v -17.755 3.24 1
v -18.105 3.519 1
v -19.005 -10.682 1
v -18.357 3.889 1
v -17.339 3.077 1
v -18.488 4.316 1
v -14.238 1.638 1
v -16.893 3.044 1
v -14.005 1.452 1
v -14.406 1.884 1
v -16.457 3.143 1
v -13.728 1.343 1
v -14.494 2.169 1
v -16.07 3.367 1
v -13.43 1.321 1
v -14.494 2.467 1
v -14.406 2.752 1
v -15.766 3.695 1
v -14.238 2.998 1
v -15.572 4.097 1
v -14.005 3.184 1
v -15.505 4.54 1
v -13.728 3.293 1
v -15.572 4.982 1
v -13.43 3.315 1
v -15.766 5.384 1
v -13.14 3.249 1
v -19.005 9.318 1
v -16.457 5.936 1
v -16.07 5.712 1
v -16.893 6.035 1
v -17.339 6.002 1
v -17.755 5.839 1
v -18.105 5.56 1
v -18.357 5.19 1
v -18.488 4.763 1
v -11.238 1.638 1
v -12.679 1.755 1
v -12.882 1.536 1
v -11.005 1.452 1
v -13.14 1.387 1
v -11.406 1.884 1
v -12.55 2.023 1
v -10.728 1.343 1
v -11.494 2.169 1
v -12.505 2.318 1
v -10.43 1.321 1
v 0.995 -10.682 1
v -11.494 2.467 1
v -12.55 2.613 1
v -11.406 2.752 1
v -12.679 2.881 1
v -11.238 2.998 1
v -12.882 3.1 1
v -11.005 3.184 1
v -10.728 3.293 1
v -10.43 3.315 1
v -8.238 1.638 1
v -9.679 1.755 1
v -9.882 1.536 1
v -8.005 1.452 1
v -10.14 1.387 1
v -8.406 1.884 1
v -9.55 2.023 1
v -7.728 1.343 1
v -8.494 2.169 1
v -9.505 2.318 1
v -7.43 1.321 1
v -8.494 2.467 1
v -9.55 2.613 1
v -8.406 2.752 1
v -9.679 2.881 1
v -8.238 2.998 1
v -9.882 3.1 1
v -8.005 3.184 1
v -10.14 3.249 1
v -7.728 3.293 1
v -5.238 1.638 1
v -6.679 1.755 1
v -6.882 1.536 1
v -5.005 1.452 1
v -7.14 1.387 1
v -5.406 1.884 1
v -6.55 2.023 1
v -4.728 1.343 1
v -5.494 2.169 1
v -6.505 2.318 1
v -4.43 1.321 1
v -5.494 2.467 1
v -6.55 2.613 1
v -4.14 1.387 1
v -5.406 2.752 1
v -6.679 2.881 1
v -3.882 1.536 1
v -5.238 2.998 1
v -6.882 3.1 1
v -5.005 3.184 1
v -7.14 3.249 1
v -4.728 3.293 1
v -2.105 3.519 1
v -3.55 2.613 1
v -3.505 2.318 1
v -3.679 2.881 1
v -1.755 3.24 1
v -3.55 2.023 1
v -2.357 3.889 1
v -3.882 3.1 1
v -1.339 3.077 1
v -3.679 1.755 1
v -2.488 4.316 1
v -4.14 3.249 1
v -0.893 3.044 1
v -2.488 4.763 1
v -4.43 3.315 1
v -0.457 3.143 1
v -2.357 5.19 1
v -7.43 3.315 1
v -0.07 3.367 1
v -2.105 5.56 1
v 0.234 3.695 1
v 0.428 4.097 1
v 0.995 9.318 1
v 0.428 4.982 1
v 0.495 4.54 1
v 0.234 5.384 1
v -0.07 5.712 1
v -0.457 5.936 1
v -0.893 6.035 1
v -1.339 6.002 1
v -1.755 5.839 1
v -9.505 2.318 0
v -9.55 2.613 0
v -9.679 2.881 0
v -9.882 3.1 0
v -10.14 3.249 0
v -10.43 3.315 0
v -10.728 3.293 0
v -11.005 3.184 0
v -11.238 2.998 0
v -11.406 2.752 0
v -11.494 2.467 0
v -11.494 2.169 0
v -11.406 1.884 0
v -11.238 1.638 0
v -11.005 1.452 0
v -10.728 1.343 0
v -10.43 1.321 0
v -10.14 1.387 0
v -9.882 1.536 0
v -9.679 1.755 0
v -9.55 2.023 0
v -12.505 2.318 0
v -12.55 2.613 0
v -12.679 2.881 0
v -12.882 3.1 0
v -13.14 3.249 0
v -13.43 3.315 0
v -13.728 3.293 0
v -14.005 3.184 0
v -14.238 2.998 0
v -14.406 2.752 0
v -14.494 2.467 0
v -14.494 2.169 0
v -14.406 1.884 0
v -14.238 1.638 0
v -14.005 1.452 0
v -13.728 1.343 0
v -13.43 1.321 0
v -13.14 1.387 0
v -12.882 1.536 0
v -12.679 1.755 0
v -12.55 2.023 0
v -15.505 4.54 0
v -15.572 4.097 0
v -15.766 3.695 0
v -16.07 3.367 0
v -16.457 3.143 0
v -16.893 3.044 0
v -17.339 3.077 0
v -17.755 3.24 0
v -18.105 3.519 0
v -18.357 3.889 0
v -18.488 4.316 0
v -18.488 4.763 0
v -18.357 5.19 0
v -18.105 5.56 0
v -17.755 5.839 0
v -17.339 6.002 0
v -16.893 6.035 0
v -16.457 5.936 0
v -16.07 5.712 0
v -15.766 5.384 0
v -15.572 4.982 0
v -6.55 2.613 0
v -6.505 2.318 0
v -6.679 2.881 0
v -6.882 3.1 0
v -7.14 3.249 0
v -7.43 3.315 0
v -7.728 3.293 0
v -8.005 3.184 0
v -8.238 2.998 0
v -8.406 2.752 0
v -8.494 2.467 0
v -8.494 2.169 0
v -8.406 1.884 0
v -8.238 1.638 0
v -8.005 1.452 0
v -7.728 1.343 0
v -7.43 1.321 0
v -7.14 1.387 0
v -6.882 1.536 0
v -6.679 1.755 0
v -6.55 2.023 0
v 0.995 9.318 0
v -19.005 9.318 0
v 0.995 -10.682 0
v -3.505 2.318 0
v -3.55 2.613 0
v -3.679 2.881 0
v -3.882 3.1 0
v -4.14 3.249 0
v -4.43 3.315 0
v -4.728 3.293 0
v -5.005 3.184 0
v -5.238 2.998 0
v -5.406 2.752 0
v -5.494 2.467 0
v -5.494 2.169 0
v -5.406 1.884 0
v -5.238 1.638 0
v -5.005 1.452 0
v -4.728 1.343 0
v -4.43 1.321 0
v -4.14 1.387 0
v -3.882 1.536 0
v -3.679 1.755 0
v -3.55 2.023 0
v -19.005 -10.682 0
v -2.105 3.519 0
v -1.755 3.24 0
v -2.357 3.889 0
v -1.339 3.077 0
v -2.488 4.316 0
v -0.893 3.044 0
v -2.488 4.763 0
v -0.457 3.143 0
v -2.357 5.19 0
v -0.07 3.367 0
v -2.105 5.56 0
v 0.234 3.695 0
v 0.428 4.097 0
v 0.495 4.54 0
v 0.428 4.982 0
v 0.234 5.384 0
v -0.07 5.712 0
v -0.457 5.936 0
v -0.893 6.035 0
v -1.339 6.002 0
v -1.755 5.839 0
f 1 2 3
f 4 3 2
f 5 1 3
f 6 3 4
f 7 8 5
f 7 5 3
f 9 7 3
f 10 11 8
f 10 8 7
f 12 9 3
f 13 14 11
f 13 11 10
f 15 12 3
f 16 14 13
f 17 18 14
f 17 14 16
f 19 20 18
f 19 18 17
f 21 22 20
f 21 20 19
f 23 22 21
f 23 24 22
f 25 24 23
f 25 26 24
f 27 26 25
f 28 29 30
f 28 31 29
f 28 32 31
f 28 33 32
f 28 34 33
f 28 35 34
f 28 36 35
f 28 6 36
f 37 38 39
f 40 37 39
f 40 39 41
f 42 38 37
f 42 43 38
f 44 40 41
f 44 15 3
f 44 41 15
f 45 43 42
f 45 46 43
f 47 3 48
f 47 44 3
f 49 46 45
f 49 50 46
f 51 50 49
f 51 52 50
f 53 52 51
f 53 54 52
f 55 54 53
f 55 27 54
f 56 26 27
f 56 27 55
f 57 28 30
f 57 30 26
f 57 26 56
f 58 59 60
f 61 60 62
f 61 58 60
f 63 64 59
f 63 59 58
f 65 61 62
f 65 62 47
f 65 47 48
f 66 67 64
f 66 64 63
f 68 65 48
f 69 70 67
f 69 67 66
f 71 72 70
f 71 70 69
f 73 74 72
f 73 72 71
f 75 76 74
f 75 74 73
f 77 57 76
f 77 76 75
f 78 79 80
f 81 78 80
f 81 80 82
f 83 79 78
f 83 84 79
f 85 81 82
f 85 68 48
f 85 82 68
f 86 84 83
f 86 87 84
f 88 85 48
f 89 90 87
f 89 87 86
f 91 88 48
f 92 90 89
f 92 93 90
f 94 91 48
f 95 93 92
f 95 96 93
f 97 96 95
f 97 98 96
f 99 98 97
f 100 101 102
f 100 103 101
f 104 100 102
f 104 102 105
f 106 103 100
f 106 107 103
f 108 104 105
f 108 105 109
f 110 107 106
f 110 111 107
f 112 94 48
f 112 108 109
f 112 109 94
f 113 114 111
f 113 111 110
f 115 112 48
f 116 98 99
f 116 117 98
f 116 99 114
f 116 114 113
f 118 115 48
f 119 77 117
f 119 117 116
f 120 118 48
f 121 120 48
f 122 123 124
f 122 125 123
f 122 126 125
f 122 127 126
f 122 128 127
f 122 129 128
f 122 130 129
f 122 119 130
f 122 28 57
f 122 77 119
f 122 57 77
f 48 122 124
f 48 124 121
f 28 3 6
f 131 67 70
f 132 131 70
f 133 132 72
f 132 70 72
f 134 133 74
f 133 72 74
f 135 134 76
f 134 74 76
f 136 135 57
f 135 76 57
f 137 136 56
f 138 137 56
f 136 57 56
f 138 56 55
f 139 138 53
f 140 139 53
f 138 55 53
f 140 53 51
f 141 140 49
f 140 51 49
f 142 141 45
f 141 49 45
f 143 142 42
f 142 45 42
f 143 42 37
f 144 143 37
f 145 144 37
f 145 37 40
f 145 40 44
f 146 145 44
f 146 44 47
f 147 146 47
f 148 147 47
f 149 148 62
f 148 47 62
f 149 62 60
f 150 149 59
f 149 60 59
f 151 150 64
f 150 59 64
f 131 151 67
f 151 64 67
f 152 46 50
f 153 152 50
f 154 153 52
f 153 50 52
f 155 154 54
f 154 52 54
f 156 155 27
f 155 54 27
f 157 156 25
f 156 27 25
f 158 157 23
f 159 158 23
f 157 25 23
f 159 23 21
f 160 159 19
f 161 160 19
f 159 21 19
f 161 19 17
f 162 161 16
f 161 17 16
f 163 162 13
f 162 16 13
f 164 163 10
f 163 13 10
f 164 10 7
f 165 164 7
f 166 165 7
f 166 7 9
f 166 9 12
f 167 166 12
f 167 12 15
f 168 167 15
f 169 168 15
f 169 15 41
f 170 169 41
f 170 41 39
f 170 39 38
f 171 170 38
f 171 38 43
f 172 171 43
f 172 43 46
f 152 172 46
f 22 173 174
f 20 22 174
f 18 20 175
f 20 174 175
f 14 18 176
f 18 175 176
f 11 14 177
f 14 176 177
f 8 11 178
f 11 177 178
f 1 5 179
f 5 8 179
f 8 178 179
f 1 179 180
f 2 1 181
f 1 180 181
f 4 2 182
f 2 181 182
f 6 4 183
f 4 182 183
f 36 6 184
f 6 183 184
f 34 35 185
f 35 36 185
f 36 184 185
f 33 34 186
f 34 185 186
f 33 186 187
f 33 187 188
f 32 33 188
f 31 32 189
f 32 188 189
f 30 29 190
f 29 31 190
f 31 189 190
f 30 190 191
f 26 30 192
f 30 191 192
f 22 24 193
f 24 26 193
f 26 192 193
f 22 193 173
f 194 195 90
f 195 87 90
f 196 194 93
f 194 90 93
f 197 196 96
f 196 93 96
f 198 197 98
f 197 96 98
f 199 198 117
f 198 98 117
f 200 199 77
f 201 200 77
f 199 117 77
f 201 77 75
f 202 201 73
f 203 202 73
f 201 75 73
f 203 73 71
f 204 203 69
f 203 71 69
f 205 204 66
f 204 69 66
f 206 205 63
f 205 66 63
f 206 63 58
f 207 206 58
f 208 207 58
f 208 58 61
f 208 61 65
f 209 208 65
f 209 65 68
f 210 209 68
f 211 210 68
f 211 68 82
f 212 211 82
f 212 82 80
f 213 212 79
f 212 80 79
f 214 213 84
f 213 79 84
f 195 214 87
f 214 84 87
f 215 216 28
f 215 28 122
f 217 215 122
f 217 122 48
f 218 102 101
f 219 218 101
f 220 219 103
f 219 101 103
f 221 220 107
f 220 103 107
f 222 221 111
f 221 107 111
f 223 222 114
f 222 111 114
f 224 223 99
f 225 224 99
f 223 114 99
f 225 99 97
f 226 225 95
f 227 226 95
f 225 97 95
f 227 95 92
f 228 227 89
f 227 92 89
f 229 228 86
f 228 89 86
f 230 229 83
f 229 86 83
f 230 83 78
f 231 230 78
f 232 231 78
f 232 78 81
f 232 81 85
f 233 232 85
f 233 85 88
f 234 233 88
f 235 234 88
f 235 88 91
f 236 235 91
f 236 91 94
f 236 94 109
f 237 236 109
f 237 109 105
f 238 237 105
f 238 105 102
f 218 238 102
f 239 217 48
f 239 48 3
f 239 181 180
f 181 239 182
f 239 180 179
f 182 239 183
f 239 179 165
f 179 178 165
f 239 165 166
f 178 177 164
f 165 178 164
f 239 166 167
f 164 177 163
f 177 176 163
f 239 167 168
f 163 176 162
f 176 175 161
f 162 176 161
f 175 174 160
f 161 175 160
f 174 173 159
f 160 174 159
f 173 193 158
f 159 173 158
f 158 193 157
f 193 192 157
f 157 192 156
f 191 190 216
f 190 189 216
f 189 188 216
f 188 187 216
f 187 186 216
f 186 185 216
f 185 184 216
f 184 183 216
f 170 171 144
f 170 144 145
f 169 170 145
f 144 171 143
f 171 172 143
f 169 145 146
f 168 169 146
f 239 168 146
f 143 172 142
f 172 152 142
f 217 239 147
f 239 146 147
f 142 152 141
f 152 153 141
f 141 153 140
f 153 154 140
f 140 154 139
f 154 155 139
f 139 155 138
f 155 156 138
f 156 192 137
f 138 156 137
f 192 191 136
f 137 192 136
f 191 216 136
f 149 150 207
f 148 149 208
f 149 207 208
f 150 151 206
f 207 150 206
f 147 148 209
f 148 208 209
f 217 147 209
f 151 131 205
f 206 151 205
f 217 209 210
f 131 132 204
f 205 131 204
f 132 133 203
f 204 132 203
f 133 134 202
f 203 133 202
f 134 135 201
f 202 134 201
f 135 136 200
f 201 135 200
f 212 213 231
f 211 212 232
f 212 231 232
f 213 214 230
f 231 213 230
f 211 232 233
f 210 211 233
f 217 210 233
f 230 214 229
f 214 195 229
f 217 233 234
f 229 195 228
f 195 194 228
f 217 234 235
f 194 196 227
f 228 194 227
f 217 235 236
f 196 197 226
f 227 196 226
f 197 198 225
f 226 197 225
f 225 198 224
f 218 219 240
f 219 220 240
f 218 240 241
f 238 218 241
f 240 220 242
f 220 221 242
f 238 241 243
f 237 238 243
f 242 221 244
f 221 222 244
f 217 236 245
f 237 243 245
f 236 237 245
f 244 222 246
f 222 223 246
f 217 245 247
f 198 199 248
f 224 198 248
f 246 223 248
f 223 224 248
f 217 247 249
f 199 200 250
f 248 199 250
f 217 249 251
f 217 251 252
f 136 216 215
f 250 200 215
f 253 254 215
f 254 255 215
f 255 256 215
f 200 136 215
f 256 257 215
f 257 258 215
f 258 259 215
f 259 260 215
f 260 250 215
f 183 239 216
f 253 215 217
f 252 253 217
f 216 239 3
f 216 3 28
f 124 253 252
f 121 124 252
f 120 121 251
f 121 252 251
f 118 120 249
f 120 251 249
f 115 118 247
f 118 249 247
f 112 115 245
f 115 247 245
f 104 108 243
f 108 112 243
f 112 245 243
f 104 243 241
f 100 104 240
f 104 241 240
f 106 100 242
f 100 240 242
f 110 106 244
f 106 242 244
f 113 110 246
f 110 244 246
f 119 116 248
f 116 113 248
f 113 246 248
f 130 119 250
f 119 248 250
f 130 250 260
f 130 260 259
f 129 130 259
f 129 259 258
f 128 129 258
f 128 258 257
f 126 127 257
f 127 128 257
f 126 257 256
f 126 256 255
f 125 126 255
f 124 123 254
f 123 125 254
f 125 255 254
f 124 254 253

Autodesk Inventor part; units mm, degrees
ref_plane "YZ Plane" through (0, 0, 0) normal (1, 0, 0) x (0, 1, 0)
ref_plane "XZ Plane" through (0, 0, 0) normal (0, 1, 0) x (-1, 0, 0)
ref_plane "XY Plane" through (0, 0, 0) normal (0, 0, 1) x (1, 0, 0)
sketch "Sketch1" plane through (0, 0, 0) normal (0, 0, 1) x (1, 0, 0)
  line L0 (-19.0052, 9.318) -> (0.9948, 9.318)
  line L1 (0.9948, 9.318) -> (0.9948, -10.682)
  line L2 (0.9948, -10.682) -> (-19.0052, -10.682)
  line L3 (-19.0052, -10.682) -> (-19.0052, 9.318)
  circle A0 centre (-17.0052, 4.5395) radius 1.5
  circle A1 centre (-1.0052, 4.5395) radius 1.5
  dimension "d1" = 20
  dimension "d2" = 20
  dimension "d3" = 3
  dimension "d4" = 2
extrude "Extrusion1" add sketch "Sketch1" along normal blind 1
sketch "Sketch2" plane through (0, 0, 1) normal (0, 0, 1) x (1, 0, 0)
  circle A0 centre (-13.5052, 2.318) radius 1
  circle A1 centre (-10.5052, 2.318) radius 1
  circle A2 centre (-17.0052, 4.5395) radius 1.5 projected
  circle A3 centre (-1.0052, 4.5395) radius 1.5 projected
  line L0 (0.9948, 9.318) -> (-19.0052, 9.318) projected
  line L1 (-9.0052, 9.318) -> (-9.0052, -10.5627)
  circle A4 centre (-4.5052, 2.318) radius 1
  circle A5 centre (-7.5052, 2.318) radius 1
  point P0 (0, 0)
  point P1 (-12.2352, 2.318)
  point P2 (-5.7752, 2.318)
  dimension "d7" = 2
  dimension "d8" = 2
  dimension "d11" = 3
  dimension "d14" = 3.5
  dimension "d19" = 7
  dimension "d21" = 7
extrude "Extrusion2" cut sketch "Sketch2" against normal blind 10 contours A0 | A1 | A4 | A5
properties part number "PCB USB-B Hembra"
